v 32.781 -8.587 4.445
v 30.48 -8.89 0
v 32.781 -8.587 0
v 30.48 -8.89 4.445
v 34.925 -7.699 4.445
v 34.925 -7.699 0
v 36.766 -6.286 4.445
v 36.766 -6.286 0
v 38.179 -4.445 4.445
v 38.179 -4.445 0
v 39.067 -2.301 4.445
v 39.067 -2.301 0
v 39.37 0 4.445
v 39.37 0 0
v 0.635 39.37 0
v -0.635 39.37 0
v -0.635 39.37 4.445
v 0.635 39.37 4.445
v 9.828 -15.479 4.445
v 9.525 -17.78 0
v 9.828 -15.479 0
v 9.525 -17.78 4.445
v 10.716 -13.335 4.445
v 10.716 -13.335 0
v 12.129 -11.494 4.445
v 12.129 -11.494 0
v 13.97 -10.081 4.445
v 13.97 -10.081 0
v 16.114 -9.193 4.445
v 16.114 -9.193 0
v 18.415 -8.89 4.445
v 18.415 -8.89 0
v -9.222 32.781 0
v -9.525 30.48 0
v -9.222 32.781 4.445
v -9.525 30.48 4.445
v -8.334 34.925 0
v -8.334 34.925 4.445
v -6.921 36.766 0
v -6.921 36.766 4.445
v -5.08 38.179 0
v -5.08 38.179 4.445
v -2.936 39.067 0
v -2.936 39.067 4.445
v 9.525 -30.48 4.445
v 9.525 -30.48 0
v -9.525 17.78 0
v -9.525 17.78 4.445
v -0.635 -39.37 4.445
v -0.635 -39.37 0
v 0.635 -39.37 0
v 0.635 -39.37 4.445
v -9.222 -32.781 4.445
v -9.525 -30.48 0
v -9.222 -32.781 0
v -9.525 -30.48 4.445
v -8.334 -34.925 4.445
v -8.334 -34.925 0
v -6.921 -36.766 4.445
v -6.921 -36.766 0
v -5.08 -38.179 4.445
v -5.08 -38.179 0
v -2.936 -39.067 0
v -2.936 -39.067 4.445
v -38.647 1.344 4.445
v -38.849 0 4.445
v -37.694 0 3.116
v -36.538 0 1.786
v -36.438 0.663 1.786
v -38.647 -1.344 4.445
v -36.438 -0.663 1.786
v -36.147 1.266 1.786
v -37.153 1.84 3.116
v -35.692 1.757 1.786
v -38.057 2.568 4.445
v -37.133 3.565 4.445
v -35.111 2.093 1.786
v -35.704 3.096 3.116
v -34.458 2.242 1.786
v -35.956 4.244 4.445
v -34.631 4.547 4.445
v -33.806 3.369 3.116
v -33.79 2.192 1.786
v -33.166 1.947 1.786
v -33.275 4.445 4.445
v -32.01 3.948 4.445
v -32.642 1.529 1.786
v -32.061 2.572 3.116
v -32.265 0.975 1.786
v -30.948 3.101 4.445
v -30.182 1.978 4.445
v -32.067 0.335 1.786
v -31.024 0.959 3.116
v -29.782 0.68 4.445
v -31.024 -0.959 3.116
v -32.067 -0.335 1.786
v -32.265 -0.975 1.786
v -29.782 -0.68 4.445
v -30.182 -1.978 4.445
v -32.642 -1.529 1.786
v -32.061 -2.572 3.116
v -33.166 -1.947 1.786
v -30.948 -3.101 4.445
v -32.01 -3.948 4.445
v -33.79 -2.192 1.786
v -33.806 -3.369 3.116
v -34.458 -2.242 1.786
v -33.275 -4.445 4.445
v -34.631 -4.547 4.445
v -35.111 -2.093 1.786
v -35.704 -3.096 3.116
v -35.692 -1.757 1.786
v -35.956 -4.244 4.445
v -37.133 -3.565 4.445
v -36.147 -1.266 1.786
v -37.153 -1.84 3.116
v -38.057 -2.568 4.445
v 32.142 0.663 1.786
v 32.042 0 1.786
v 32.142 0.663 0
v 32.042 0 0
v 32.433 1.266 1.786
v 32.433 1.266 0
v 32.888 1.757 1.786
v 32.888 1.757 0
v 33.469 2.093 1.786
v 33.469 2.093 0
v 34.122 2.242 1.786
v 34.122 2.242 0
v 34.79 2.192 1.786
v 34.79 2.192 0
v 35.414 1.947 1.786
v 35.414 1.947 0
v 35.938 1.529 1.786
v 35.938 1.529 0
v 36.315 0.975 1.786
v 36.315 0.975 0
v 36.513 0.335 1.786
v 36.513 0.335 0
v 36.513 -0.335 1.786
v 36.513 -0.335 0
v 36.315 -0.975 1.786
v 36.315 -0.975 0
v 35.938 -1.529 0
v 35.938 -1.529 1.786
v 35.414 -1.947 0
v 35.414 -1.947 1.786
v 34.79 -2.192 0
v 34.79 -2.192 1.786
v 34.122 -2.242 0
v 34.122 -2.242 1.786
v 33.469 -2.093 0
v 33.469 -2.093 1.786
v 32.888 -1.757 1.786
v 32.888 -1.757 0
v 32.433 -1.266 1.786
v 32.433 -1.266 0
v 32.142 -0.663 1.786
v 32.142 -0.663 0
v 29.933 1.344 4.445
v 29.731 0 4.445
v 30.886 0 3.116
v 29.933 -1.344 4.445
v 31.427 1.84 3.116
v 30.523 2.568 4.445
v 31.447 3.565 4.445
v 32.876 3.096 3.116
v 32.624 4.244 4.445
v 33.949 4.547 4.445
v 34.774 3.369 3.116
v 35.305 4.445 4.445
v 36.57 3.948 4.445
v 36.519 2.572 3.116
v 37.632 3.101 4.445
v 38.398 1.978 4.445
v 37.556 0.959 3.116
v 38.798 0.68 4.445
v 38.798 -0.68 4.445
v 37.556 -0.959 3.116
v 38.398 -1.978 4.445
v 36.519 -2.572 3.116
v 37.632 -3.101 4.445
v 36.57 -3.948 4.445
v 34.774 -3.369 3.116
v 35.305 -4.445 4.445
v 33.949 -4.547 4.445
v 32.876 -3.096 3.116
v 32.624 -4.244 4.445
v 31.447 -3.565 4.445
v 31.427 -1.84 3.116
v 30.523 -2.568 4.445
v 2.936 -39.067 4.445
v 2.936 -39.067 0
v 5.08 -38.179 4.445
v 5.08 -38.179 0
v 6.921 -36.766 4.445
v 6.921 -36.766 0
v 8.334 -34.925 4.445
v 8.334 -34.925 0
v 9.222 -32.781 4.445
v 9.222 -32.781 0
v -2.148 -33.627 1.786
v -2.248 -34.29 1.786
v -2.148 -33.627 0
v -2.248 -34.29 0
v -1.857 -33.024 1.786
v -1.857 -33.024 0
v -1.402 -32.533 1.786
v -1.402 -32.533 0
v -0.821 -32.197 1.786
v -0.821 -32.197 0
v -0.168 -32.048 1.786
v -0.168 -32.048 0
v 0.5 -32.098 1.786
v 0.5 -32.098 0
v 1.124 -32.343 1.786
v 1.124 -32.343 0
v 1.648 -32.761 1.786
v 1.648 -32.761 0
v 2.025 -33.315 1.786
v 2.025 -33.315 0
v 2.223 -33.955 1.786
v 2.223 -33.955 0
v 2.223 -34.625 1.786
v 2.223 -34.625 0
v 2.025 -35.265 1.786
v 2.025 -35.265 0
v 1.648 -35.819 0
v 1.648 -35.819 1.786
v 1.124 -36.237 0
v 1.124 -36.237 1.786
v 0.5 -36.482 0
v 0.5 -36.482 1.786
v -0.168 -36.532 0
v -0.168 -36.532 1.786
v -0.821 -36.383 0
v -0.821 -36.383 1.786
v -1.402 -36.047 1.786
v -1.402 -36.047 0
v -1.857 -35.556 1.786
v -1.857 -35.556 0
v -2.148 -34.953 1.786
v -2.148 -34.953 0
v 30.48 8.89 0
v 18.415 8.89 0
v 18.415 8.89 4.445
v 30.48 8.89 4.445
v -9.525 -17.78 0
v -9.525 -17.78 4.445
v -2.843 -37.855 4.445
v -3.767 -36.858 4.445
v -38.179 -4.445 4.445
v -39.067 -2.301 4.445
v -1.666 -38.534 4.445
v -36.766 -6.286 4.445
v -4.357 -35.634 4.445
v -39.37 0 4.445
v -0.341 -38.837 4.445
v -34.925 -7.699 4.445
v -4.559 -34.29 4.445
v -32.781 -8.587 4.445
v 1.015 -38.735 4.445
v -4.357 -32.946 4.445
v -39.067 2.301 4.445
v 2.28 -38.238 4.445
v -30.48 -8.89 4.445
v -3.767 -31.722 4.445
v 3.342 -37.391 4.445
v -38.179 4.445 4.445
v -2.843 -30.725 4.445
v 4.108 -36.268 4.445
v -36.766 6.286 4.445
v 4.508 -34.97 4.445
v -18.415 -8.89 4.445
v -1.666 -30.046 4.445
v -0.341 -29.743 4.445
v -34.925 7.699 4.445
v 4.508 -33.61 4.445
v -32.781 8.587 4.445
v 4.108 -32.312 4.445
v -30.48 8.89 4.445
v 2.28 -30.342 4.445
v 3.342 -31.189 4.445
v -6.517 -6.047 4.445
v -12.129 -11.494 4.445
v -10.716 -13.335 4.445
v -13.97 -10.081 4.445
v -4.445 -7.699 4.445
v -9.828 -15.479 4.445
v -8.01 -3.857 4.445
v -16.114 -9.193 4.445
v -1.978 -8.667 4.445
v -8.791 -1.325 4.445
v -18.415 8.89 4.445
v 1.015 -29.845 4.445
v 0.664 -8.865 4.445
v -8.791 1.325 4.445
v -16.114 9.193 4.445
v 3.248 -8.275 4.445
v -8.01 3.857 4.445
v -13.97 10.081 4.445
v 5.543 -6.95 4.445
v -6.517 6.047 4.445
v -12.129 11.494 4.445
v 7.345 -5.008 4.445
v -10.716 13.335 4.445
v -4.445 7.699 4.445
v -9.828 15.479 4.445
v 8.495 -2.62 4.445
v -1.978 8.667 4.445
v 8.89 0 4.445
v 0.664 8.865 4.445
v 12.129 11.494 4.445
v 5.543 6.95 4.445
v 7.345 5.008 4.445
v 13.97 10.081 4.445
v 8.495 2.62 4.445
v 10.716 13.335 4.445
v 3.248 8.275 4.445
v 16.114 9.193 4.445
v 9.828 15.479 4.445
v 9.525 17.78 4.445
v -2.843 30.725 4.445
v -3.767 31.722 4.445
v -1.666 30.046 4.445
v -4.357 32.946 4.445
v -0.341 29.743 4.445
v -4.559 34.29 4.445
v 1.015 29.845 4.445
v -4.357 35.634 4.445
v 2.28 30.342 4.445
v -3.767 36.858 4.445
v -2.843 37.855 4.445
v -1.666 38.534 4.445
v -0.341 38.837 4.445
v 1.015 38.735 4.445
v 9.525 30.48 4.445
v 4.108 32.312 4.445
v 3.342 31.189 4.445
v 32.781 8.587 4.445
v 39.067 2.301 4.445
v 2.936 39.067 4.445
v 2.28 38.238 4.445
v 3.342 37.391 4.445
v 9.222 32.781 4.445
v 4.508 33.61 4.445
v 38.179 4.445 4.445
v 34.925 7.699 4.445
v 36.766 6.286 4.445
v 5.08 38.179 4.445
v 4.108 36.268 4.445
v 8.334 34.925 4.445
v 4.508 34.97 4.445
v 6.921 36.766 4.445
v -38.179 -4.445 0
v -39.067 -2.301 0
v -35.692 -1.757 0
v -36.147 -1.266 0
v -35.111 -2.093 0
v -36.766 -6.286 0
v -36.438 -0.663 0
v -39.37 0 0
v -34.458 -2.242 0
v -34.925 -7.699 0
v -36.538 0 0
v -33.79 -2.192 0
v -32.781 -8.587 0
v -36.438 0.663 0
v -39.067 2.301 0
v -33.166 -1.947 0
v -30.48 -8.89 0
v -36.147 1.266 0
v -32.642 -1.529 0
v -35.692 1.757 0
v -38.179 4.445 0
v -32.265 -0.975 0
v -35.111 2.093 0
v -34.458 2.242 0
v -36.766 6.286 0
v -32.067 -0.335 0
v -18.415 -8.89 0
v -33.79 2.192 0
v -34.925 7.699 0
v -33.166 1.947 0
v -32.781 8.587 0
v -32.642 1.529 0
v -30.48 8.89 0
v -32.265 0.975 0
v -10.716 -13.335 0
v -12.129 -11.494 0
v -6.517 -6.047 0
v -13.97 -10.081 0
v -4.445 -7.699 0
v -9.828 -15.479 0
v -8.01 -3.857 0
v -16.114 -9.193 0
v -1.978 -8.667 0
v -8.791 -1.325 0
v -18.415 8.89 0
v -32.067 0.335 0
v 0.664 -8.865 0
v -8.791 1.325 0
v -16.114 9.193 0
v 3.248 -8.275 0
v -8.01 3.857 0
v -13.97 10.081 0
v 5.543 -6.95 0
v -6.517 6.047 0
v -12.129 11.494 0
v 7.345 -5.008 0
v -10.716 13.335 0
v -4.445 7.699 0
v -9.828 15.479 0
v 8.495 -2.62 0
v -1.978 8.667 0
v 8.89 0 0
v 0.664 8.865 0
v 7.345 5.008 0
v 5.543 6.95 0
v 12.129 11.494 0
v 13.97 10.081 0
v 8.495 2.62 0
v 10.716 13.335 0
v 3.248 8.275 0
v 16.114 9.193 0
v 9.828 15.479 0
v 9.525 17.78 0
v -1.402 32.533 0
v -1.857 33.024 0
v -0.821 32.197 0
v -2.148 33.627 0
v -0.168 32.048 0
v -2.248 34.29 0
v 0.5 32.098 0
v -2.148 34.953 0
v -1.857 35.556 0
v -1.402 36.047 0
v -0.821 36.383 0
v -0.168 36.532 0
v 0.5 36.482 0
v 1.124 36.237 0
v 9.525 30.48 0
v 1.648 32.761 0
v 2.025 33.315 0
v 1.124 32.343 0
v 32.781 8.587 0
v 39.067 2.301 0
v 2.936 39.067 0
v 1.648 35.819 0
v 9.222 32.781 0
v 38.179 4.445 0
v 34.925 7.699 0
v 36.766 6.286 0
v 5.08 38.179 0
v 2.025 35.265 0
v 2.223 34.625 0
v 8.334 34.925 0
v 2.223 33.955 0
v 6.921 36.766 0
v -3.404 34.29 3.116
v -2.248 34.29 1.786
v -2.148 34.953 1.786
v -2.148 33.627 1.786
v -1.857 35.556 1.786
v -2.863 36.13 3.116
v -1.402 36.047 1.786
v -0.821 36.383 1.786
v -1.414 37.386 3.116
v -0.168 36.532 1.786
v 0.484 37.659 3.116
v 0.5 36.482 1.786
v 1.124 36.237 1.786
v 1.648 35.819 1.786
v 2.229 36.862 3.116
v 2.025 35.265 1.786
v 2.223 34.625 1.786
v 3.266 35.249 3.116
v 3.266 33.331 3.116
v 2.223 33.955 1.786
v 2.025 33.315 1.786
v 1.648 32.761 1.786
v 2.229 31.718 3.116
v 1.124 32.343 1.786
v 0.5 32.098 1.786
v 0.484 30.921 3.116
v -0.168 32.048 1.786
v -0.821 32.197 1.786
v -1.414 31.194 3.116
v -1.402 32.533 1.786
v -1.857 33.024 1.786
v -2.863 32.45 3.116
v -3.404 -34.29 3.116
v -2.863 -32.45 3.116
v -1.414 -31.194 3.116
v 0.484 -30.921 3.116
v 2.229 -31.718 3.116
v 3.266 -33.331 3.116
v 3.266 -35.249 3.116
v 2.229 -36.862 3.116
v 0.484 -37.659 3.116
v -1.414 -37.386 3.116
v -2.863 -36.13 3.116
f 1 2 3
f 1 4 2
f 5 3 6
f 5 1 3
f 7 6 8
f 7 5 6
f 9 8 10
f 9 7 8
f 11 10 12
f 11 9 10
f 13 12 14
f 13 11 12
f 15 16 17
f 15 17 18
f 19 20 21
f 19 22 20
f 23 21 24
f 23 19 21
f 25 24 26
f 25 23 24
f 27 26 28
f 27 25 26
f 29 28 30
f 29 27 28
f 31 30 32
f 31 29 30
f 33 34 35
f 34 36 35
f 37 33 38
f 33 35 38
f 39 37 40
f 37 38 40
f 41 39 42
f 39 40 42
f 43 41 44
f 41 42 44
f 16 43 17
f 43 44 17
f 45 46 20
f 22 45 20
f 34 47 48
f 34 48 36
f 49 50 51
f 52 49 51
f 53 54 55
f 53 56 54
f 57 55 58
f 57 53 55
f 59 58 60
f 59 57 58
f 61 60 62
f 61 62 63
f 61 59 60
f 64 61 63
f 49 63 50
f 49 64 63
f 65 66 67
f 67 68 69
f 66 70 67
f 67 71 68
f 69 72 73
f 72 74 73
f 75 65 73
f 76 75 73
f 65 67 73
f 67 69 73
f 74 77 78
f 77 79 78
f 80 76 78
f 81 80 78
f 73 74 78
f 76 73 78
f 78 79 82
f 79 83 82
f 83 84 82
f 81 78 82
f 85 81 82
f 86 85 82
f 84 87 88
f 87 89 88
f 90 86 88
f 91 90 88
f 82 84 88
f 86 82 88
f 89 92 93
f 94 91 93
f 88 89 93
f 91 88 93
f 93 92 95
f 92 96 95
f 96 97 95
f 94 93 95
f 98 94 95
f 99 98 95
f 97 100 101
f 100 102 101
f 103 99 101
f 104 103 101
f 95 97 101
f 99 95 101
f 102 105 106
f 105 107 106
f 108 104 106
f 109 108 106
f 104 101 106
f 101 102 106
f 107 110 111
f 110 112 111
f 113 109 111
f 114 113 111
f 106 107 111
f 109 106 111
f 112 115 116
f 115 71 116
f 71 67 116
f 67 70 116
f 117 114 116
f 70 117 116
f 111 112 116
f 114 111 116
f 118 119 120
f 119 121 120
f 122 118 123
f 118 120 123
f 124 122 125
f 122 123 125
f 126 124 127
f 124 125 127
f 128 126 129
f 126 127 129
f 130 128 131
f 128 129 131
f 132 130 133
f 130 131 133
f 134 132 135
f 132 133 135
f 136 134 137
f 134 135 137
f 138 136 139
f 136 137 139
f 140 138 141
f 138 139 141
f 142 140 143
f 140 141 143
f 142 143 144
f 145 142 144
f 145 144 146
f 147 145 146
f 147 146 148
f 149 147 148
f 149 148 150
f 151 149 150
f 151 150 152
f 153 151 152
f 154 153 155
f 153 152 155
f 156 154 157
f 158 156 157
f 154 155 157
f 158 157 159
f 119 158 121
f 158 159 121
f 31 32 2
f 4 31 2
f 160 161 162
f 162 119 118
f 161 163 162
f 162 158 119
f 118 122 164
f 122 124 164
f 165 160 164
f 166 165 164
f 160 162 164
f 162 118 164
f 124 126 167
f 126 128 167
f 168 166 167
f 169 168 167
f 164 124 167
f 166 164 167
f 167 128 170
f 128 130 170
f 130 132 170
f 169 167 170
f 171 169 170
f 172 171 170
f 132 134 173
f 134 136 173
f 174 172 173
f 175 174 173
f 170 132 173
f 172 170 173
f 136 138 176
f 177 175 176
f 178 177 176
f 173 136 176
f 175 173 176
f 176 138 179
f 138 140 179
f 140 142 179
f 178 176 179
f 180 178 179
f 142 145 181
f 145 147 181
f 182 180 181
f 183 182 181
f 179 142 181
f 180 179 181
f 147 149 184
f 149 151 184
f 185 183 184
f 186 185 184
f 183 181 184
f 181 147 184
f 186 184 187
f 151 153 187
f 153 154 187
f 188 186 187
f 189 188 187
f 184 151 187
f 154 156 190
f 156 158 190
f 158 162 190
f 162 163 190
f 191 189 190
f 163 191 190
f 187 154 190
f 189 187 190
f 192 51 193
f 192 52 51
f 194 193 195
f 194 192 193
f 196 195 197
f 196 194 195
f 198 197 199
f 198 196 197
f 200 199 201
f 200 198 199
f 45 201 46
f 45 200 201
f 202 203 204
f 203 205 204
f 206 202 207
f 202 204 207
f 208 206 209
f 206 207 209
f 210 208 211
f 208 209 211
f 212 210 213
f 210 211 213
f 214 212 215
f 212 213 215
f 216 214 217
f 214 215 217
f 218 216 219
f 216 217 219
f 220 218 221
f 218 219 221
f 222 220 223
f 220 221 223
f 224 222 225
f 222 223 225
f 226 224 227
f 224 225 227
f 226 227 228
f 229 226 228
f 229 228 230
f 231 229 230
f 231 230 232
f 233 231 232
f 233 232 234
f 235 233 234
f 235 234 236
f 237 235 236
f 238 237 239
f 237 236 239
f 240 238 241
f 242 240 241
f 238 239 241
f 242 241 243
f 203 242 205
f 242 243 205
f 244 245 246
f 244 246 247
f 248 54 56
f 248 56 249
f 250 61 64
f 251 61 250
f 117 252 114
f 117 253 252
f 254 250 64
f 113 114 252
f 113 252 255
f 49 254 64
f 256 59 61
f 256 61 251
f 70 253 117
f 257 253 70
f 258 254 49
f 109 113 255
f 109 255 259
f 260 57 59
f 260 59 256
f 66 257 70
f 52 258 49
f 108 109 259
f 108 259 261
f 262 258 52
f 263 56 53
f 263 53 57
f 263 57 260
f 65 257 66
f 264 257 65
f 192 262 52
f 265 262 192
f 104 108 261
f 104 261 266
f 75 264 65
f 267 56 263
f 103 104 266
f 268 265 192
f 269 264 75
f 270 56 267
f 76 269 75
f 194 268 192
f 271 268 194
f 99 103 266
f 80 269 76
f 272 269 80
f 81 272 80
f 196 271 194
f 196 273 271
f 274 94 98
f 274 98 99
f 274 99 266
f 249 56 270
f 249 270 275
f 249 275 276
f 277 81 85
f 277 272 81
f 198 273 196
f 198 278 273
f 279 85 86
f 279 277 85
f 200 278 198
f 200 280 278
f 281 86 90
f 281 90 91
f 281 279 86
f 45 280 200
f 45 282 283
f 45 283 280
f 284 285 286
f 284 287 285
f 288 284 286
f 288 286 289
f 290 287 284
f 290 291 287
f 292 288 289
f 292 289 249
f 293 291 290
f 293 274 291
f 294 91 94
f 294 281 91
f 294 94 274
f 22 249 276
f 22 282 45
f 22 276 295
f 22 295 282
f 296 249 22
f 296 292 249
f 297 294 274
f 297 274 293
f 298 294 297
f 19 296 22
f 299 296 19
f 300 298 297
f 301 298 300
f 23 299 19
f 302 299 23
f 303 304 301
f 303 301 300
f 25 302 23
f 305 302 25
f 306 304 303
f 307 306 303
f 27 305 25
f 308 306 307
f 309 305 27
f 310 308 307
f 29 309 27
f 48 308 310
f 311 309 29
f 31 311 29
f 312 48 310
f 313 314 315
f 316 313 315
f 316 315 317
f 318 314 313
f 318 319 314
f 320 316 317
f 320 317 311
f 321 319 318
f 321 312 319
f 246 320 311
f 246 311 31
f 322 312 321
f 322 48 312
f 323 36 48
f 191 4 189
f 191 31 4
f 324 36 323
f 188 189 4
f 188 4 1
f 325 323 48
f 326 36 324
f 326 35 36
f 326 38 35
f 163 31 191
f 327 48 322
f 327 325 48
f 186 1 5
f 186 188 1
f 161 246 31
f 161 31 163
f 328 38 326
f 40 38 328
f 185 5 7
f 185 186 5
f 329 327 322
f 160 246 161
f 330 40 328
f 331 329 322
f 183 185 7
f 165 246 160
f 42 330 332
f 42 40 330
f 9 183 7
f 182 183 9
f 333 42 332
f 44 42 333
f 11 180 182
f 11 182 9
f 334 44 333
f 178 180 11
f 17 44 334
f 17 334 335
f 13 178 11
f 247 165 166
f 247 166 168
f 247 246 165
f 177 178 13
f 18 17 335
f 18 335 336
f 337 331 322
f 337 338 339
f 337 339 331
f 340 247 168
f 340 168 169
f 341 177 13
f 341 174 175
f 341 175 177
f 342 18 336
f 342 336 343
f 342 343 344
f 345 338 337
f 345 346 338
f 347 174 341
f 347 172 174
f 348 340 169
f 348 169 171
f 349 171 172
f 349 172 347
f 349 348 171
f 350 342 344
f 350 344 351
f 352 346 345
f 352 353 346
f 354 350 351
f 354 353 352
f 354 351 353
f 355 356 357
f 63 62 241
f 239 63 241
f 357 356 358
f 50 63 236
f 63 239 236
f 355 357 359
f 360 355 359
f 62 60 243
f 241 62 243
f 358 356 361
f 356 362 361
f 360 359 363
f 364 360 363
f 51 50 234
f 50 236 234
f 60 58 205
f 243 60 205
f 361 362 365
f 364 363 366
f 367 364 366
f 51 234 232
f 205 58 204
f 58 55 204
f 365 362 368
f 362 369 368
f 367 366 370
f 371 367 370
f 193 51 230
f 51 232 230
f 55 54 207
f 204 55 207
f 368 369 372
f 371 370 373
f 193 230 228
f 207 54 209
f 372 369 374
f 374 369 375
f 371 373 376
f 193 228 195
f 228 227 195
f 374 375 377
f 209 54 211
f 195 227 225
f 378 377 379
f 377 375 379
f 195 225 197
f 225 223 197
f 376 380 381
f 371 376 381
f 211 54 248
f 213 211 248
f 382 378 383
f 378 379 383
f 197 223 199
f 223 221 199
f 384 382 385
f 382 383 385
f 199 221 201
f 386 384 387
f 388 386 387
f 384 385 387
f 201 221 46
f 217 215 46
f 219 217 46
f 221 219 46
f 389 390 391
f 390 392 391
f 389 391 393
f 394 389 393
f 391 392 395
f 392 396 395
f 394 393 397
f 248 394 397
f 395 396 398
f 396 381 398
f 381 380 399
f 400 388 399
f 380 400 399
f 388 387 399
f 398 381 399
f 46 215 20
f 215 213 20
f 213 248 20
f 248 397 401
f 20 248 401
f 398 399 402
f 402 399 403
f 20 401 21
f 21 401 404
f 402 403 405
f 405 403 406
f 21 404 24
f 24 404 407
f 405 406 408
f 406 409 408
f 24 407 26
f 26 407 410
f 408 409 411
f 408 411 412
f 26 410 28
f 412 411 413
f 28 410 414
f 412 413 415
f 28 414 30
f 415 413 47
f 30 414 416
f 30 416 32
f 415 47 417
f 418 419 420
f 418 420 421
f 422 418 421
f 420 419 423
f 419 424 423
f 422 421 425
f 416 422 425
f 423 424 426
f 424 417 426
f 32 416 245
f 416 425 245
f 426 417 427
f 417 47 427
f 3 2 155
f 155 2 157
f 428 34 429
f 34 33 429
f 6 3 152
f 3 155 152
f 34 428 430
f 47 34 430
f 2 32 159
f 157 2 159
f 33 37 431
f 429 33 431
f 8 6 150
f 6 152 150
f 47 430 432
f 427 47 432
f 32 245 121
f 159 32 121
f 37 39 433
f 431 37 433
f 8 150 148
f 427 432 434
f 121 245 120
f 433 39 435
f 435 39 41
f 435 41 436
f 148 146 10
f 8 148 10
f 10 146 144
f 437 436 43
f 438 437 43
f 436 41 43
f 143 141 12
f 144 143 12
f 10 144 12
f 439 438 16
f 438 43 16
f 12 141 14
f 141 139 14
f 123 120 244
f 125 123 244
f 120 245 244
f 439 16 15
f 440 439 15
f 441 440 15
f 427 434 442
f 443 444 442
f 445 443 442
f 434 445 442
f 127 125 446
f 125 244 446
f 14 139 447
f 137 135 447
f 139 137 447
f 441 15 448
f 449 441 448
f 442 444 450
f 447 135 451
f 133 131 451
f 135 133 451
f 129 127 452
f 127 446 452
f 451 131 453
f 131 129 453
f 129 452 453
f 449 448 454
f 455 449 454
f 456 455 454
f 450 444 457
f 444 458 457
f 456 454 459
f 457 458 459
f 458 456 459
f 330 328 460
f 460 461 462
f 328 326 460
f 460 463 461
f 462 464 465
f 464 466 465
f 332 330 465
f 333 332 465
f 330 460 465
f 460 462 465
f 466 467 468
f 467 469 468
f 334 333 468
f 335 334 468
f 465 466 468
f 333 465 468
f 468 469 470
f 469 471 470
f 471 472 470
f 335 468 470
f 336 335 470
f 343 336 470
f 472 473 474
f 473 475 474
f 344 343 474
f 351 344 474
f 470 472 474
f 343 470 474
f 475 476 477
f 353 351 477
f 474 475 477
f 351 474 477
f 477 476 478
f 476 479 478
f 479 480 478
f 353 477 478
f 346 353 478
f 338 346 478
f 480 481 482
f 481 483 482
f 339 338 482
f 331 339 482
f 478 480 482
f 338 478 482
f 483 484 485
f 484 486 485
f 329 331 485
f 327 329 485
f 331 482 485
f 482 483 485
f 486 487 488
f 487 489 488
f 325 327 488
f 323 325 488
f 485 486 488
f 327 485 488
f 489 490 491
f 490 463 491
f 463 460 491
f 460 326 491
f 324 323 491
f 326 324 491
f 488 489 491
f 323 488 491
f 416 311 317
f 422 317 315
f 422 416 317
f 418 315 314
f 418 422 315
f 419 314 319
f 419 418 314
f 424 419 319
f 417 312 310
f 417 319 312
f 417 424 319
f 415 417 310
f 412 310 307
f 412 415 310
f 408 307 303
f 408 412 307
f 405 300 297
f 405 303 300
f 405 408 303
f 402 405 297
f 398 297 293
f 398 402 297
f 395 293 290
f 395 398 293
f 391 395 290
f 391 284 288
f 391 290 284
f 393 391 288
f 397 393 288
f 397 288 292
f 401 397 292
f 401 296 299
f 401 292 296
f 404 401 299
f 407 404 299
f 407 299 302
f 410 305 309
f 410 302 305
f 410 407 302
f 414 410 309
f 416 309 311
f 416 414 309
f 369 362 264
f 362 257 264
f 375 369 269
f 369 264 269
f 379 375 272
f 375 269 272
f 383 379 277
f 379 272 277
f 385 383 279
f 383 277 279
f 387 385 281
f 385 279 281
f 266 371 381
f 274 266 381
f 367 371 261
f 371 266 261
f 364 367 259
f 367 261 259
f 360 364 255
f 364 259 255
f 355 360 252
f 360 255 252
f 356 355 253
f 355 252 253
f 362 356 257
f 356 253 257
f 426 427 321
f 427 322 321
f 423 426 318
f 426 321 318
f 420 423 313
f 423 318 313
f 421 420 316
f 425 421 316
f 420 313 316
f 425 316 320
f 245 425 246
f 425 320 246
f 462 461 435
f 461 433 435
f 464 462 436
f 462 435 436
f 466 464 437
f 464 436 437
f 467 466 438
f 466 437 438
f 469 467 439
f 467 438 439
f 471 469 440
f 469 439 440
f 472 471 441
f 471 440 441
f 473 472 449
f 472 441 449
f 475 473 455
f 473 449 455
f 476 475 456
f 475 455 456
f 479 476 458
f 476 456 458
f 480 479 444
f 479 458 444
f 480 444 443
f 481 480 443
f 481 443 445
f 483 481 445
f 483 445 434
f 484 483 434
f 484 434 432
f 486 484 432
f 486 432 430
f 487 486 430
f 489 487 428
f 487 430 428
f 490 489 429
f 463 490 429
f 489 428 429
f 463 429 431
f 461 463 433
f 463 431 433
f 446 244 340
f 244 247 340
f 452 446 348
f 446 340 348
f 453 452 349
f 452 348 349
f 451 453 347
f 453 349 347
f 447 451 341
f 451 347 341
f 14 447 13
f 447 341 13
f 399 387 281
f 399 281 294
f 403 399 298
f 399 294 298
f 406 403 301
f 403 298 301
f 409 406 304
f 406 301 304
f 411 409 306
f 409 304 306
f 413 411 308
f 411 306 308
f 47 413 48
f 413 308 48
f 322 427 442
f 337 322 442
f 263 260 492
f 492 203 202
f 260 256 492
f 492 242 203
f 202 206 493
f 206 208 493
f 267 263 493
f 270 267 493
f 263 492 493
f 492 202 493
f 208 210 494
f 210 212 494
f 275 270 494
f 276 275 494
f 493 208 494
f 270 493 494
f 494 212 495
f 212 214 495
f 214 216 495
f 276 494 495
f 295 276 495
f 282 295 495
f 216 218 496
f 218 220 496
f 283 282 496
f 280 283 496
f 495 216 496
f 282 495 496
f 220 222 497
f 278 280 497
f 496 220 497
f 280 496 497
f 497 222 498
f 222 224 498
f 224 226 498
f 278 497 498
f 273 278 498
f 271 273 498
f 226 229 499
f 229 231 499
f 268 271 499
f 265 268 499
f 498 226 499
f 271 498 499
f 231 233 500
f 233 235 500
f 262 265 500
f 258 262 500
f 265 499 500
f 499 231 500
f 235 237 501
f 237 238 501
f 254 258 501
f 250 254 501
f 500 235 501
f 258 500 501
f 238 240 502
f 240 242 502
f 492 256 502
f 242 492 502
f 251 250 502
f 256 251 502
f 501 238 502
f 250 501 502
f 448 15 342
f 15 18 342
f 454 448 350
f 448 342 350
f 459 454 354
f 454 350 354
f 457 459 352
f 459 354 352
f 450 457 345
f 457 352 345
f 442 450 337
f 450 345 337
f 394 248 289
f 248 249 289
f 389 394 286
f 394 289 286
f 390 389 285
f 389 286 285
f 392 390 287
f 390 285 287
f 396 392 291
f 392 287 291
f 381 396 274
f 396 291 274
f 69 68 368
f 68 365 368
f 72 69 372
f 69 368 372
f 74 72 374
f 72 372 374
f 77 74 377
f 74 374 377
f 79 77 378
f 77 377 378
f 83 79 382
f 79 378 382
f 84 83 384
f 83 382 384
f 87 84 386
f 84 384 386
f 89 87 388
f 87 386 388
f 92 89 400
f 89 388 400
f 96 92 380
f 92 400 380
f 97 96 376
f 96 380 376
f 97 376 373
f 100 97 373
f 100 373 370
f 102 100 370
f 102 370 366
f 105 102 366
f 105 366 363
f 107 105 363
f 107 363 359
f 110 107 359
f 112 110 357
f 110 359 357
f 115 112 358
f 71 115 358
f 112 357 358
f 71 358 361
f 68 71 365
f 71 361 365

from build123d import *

# Parameters (mm, degrees)
F0_W           = 78.74
F0_H           = 17.78
F1_DEPTH       = 4.445
F2_W           = 19.05
F2_H           = 78.74
F3_DEPTH       = 4.445
F4_R           = 8.88999
F6_D           = 4.4958
F6_CSINK_D     = 9.1186
F6_CSINK_ANGLE = 82
F7_R           = 8.89
F8_DEPTH       = 4.446


# Not quite as in the source:
# - a fillet or chamfer is up to 0.001 mm smaller than in the source, because OpenCascade refuses the exact size


with BuildPart() as f1:
    # F0 (on Top) → F1 (new body)
    with BuildSketch(Plane.XY):
        Rectangle(F0_W, F0_H)
    extrude(amount=F1_DEPTH)

    # F2 (on Top) → F3 (join, through all)
    with BuildSketch(Plane.XY):
        Rectangle(F2_W, F2_H)
    extrude(amount=F3_DEPTH)

    # F4 (radius 8.89 in the source; OpenCascade refuses exactly that, so slightly less here)
    f4_edges = [f1.edges().sort_by_distance(p)[0] for p in [
        (9.525, -39.37, 2.2225),
        (-9.525, -39.37, 2.2225),
        (39.37, -8.89, 2.2225),
        (39.37, 8.89, 2.2225),
        (9.525, 39.37, 2.2225),
        (-39.37, -8.89, 2.2225),
        (-39.37, 8.89, 2.2225),
        (-9.525, 8.89, 2.2225),
        (-9.525, 39.37, 2.2225),
        (-9.525, -8.89, 2.2225),
        (9.525, -8.89, 2.2225),
        (9.525, 8.89, 2.2225),
    ]]
    fillet(f4_edges, radius=F4_R)

    # F6 (through all)
    with Locations(Plane.XY.offset(4.445)):
        with Locations((34.29, 0), (0, -34.29), (-34.29, 0), (0, 34.29)):
            CounterSinkHole(F6_D / 2, F6_CSINK_D / 2, counter_sink_angle=F6_CSINK_ANGLE)

    # F7 (on Top) → F8 (cut, through all)
    with BuildSketch(Plane.XY):
        Circle(F7_R)
    extrude(amount=F8_DEPTH, mode=Mode.SUBTRACT)


solid = f1.part
